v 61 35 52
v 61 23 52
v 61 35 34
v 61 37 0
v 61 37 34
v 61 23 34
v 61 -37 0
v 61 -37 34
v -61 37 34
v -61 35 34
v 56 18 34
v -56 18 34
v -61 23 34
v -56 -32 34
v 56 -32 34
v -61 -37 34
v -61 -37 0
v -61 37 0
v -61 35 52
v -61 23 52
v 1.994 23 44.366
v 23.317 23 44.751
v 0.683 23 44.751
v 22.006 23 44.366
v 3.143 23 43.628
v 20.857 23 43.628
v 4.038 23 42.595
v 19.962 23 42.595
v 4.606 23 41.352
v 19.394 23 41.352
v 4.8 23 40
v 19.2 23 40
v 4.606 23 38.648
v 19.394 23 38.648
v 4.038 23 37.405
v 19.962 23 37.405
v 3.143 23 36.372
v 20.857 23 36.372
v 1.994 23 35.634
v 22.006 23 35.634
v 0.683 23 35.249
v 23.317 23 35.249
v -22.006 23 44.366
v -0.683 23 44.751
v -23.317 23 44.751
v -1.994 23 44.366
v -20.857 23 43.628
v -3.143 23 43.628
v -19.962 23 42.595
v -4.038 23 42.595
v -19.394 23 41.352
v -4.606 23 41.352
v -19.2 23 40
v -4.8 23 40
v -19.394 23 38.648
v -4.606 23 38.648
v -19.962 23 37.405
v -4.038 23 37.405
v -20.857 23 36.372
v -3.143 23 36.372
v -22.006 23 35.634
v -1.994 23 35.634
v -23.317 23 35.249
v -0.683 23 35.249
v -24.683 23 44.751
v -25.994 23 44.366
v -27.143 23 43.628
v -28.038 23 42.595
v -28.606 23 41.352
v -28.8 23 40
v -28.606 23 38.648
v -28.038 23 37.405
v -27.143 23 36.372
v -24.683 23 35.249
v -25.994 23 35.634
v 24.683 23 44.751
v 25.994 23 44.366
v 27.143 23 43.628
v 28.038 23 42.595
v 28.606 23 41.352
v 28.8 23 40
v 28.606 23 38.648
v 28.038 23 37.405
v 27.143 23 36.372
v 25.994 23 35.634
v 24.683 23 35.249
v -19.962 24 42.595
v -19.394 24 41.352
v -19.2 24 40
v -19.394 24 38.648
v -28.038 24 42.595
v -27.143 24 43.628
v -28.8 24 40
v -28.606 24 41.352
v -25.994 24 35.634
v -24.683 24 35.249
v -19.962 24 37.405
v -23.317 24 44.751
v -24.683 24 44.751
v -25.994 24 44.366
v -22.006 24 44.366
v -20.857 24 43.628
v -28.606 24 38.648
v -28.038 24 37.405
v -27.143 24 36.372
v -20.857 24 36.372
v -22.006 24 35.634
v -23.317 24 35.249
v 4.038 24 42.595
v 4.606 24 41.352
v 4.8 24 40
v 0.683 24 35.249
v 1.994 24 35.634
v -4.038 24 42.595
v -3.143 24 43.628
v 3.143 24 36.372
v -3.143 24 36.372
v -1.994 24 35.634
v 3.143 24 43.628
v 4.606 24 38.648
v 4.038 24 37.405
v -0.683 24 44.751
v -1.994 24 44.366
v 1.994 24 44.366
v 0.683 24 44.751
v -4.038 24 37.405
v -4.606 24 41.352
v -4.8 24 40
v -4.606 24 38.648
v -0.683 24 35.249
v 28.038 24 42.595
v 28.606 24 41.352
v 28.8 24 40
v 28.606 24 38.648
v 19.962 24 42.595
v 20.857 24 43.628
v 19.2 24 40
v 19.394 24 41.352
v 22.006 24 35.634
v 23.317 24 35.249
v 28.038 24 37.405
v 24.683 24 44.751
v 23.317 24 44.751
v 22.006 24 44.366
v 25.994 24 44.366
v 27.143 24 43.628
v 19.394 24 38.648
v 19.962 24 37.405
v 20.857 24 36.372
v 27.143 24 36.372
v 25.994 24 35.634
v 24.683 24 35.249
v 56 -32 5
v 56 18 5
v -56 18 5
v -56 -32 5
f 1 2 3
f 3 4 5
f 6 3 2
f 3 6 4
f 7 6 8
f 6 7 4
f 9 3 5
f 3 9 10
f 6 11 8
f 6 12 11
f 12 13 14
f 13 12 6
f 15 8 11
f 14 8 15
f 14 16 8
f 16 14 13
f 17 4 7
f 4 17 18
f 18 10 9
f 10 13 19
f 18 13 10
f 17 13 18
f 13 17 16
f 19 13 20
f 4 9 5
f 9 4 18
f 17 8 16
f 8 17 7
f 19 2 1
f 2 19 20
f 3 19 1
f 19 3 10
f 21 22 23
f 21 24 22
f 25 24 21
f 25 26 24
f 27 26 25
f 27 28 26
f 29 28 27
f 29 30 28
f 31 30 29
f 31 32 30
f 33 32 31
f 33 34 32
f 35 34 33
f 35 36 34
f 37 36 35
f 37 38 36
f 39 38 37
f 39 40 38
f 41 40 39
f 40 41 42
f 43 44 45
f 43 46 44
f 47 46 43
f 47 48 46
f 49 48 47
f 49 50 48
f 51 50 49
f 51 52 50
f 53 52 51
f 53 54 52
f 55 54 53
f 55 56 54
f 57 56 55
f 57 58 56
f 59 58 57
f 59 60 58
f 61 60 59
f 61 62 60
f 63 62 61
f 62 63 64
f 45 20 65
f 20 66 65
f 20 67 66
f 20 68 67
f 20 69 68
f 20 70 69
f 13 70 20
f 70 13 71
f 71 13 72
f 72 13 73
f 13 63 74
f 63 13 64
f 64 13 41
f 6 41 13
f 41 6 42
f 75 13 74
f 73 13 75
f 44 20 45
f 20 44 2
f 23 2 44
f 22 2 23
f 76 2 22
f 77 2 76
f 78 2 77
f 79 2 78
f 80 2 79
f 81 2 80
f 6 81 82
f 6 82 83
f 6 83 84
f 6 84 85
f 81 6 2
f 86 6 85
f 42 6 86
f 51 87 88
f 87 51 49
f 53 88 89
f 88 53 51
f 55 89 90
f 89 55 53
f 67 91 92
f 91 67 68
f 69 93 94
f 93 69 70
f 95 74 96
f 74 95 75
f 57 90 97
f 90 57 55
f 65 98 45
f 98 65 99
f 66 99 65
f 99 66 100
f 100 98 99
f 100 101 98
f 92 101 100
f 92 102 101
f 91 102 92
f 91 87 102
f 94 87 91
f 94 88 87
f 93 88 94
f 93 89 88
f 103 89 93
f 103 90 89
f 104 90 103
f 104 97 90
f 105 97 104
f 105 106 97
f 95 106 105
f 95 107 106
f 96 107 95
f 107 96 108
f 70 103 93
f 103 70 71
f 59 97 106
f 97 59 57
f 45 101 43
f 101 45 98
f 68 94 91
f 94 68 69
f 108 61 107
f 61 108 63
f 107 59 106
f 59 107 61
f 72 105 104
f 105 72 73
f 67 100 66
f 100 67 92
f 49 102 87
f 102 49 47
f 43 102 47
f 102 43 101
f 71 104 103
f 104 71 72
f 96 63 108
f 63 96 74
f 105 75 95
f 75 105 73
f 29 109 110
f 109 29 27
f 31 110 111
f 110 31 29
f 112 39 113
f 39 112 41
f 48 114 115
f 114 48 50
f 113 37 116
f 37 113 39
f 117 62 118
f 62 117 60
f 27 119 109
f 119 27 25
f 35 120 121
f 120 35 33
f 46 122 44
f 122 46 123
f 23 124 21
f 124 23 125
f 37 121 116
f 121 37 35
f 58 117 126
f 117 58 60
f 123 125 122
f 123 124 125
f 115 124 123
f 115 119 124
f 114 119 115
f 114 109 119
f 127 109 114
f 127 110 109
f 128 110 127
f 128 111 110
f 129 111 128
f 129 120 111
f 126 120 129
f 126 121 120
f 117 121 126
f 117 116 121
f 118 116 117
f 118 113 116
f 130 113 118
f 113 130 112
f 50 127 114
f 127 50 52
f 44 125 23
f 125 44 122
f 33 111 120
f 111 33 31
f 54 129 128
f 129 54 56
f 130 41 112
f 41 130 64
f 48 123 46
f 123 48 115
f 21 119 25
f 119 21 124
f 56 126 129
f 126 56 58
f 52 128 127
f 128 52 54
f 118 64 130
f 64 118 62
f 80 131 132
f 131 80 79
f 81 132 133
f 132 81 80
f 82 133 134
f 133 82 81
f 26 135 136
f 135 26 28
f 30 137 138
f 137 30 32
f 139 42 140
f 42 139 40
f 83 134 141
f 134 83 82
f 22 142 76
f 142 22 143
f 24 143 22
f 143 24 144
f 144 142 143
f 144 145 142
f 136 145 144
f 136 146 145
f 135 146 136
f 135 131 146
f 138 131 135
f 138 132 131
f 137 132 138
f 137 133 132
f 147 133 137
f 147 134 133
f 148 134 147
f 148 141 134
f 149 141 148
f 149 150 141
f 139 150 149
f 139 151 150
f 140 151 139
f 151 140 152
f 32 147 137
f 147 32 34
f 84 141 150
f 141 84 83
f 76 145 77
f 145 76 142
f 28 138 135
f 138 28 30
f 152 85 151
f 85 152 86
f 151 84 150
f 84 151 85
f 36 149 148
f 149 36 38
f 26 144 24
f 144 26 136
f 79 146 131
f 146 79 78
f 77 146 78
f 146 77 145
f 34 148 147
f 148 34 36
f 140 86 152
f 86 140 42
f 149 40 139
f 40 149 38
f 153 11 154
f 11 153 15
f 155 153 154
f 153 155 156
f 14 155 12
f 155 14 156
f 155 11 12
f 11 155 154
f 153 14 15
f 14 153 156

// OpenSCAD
// file: lib/commerce_forms.scad
// Original parametric printable prototypes. Dimensions in millimeters.
// CAD is the manufacturing authority; Three.js gallery geometry is a stylized preview.
// No external copyrighted silhouettes, brands, logos or character geometry.
$fn=56;
module market_lantern(v=1) {
  r=27+v*2; h=76+v*6; wall=2.8;
  difference() {
    cylinder(r=r,h=h);
    translate([0,0,-1]) cylinder(r=r-wall,h=h+2);
    for (tier=[0:3], j=[0:7+v]) {
      a=360*j/(8+v)+tier*15;
      rotate([0,0,a])
        translate([r-1,0,17+tier*(h-33)/3])
          rotate([0,90,0]) cylinder(r=2.2+(v%3)*.5,h=10,center=true,$fn=18);
    }
  }
}
module market_figurine(v=1) {
  r=18+v;
  union() {
    cylinder(r=29,h=6);
    translate([0,0,7]) scale([1,0.85,1.15]) sphere(r=r);
    translate([0,0,35]) scale([1,.91,.84]) sphere(r=r*.78);
    for (s=[-1,1]) {
      translate([s*(r*.58),0,49])
        rotate([0,s*13,0]) cylinder(r1=5+v*.4,r2=1,h=10+v*2);
      translate([s*(r*.73),-2,20]) scale([.36,.55,.67]) sphere(r=r*.75);
    }
    translate([0,-r*.62,39]) sphere(r=3.5+v*.2);
    for(s=[-1,1])translate([s*7,-r*.72,43])sphere(r=1.8);
  }
}
module market_scenery(v=1) {
  union() {
    translate([-52,-32,0]) cube([104,64,4]);
    for (i=[0:2+v%2]) {
      x=-40+i*24;
      translate([x, -14+(i%2)*12,3.8])
        cube([15+v*2,19,13+v*3]);
      translate([x+2,-13+(i%2)*12,16+v*3])
        cube([11+v*2,15,3]);
    }
    for(i=[-1,1]) {
      translate([i*42,20,3.8]) cylinder(r=5,h=12+v*4);
      translate([i*42,20,15+v*4]) sphere(r=6);
    }
  }
}
module market_organizer(v=1) {
  w=104+v*5;d=69+v*3;h=32+v*3; columns=2+v%3;
  difference() {
    translate([-w/2,-d/2,0]) cube([w,d,h]);
    for(i=[0:columns-1])
      translate([-w/2+3+i*(w-6)/columns,-d/2+3,4])
        cube([(w-6)/columns-3,d-6,h+3]);
  }
}
module market_display(v=1) {
  union() {
    cylinder(r=34+v*2,h=6);
    translate([0,0,5.8]) cylinder(r1=12+v,r2=9,h=26+v*3);
    translate([0,0,30+v*3]) cylinder(r=25+v,h=5);
    for(s=[-1,1])
      translate([s*(16+v),0,34+v*3])
        cube([5,31,10],center=true);
  }
}
module market_gaming(v=1) {
  w=102+v*5;d=66+v*2; h=22+v*3;
  difference() {
    union() {
      translate([-w/2,-d/2,0]) cube([w,d,h]);
      translate([-w/2, d/2-14,h-1]) cube([w,12,15+v]);
    }
    translate([-w/2+5,-d/2+5,5]) cube([w-10,d-24,h+12]);
    for(i=[-1,0,1])
      translate([i*24,d/2-13,h+6]) rotate([90,0,0])
        cylinder(r=3.6+v*.3,h=16,$fn=22);
  }
}
module market_jewelry(v=1) {
  union() {
    translate([-40,-26,0]) cube([80,52,6]);
    for (i=[0:3+v%2]) {
      x=-29+i*58/(3+v%2);
      translate([x,0,5.8]) cylinder(r=3.2,h=42+v*5,$fn=24);
      translate([x,0,46+v*5]) sphere(r=5);
    }
    translate([-33,-5,42+v*5]) cube([66,9,6]);
    for(i=[0:4])translate([-25+i*12,0,46+v*5])
      cylinder(r1=4,r2=1.5,h=7,$fn=20);
  }
}
module market_planter(v=1) {
  r=34+v*2; h=48+v*6; w=3.2;
  difference() {
    union() {
      cylinder(r=r,h=h);
      for(i=[0:9+v])
        rotate([0,0,360*i/(10+v)])
          translate([r-.5,-1.6,2]) cube([2.2,3.2,h-4]);
    }
    translate([0,0,3.8]) cylinder(r=r-w,h=h+2);
    translate([0,0,-1]) cylinder(r=2.8,h=7,$fn=24);
  }
}
module market_gift(v=1,label="CUSTOM") {
  w=100+v*6;d=49+v*3;
  difference() {
    union() {
      hull()for(x=[-w/2+7,w/2-7],y=[-d/2+7,d/2-7])
        translate([x,y,0]) cylinder(r=7,h=6,$fn=24);
      translate([0,0,5.8]) linear_extrude(height=2.2)
        text(label,size=max(9,18-v),halign="center",valign="center",
             font="Liberation Sans:style=Bold");
    }
    if(v==3)for(x=[-w/2+10,w/2-10])
      translate([x,d/2-10,-1]) cylinder(r=2.5,h=10,$fn=24);
  }
}
module market_cosplay(v=1) {
  r=28+v*2;
  difference() {
    union() {
      cylinder(r=r,h=4.5,$fn=8+v*2);
      for(i=[0:4+v])
        rotate([0,0,360*i/(5+v)])
          translate([r*.45,0,4.2]) cylinder(r=4.2,h=1.8,$fn=6);
      cylinder(r=12+v*.5,h=7,$fn=5+v);
    }
    translate([0,r*.70,-1])cylinder(r=3.3,h=10,$fn=24);
  }
}
module commercial_form(family="lantern",variant=1,label="CUSTOM") {
  if(family=="lantern")market_lantern(variant);
  else if(family=="figurine")market_figurine(variant);
  else if(family=="scenery")market_scenery(variant);
  else if(family=="organizer")market_organizer(variant);
  else if(family=="display")market_display(variant);
  else if(family=="gaming")market_gaming(variant);
  else if(family=="jewelry")market_jewelry(variant);
  else if(family=="planter")market_planter(variant);
  else if(family=="gift")market_gift(variant,label);
  else if(family=="cosplay")market_cosplay(variant);
  else assert(false,str("Unknown family: ",family));
}
// main file
// Original 3D printable CAD prototype for Boardgame Token Sorter
// Millimeter units; edit parameters and print-test before commercial shipment.
use <lib/commerce_forms.scad>
commercial_form(family="gaming",variant=4);
